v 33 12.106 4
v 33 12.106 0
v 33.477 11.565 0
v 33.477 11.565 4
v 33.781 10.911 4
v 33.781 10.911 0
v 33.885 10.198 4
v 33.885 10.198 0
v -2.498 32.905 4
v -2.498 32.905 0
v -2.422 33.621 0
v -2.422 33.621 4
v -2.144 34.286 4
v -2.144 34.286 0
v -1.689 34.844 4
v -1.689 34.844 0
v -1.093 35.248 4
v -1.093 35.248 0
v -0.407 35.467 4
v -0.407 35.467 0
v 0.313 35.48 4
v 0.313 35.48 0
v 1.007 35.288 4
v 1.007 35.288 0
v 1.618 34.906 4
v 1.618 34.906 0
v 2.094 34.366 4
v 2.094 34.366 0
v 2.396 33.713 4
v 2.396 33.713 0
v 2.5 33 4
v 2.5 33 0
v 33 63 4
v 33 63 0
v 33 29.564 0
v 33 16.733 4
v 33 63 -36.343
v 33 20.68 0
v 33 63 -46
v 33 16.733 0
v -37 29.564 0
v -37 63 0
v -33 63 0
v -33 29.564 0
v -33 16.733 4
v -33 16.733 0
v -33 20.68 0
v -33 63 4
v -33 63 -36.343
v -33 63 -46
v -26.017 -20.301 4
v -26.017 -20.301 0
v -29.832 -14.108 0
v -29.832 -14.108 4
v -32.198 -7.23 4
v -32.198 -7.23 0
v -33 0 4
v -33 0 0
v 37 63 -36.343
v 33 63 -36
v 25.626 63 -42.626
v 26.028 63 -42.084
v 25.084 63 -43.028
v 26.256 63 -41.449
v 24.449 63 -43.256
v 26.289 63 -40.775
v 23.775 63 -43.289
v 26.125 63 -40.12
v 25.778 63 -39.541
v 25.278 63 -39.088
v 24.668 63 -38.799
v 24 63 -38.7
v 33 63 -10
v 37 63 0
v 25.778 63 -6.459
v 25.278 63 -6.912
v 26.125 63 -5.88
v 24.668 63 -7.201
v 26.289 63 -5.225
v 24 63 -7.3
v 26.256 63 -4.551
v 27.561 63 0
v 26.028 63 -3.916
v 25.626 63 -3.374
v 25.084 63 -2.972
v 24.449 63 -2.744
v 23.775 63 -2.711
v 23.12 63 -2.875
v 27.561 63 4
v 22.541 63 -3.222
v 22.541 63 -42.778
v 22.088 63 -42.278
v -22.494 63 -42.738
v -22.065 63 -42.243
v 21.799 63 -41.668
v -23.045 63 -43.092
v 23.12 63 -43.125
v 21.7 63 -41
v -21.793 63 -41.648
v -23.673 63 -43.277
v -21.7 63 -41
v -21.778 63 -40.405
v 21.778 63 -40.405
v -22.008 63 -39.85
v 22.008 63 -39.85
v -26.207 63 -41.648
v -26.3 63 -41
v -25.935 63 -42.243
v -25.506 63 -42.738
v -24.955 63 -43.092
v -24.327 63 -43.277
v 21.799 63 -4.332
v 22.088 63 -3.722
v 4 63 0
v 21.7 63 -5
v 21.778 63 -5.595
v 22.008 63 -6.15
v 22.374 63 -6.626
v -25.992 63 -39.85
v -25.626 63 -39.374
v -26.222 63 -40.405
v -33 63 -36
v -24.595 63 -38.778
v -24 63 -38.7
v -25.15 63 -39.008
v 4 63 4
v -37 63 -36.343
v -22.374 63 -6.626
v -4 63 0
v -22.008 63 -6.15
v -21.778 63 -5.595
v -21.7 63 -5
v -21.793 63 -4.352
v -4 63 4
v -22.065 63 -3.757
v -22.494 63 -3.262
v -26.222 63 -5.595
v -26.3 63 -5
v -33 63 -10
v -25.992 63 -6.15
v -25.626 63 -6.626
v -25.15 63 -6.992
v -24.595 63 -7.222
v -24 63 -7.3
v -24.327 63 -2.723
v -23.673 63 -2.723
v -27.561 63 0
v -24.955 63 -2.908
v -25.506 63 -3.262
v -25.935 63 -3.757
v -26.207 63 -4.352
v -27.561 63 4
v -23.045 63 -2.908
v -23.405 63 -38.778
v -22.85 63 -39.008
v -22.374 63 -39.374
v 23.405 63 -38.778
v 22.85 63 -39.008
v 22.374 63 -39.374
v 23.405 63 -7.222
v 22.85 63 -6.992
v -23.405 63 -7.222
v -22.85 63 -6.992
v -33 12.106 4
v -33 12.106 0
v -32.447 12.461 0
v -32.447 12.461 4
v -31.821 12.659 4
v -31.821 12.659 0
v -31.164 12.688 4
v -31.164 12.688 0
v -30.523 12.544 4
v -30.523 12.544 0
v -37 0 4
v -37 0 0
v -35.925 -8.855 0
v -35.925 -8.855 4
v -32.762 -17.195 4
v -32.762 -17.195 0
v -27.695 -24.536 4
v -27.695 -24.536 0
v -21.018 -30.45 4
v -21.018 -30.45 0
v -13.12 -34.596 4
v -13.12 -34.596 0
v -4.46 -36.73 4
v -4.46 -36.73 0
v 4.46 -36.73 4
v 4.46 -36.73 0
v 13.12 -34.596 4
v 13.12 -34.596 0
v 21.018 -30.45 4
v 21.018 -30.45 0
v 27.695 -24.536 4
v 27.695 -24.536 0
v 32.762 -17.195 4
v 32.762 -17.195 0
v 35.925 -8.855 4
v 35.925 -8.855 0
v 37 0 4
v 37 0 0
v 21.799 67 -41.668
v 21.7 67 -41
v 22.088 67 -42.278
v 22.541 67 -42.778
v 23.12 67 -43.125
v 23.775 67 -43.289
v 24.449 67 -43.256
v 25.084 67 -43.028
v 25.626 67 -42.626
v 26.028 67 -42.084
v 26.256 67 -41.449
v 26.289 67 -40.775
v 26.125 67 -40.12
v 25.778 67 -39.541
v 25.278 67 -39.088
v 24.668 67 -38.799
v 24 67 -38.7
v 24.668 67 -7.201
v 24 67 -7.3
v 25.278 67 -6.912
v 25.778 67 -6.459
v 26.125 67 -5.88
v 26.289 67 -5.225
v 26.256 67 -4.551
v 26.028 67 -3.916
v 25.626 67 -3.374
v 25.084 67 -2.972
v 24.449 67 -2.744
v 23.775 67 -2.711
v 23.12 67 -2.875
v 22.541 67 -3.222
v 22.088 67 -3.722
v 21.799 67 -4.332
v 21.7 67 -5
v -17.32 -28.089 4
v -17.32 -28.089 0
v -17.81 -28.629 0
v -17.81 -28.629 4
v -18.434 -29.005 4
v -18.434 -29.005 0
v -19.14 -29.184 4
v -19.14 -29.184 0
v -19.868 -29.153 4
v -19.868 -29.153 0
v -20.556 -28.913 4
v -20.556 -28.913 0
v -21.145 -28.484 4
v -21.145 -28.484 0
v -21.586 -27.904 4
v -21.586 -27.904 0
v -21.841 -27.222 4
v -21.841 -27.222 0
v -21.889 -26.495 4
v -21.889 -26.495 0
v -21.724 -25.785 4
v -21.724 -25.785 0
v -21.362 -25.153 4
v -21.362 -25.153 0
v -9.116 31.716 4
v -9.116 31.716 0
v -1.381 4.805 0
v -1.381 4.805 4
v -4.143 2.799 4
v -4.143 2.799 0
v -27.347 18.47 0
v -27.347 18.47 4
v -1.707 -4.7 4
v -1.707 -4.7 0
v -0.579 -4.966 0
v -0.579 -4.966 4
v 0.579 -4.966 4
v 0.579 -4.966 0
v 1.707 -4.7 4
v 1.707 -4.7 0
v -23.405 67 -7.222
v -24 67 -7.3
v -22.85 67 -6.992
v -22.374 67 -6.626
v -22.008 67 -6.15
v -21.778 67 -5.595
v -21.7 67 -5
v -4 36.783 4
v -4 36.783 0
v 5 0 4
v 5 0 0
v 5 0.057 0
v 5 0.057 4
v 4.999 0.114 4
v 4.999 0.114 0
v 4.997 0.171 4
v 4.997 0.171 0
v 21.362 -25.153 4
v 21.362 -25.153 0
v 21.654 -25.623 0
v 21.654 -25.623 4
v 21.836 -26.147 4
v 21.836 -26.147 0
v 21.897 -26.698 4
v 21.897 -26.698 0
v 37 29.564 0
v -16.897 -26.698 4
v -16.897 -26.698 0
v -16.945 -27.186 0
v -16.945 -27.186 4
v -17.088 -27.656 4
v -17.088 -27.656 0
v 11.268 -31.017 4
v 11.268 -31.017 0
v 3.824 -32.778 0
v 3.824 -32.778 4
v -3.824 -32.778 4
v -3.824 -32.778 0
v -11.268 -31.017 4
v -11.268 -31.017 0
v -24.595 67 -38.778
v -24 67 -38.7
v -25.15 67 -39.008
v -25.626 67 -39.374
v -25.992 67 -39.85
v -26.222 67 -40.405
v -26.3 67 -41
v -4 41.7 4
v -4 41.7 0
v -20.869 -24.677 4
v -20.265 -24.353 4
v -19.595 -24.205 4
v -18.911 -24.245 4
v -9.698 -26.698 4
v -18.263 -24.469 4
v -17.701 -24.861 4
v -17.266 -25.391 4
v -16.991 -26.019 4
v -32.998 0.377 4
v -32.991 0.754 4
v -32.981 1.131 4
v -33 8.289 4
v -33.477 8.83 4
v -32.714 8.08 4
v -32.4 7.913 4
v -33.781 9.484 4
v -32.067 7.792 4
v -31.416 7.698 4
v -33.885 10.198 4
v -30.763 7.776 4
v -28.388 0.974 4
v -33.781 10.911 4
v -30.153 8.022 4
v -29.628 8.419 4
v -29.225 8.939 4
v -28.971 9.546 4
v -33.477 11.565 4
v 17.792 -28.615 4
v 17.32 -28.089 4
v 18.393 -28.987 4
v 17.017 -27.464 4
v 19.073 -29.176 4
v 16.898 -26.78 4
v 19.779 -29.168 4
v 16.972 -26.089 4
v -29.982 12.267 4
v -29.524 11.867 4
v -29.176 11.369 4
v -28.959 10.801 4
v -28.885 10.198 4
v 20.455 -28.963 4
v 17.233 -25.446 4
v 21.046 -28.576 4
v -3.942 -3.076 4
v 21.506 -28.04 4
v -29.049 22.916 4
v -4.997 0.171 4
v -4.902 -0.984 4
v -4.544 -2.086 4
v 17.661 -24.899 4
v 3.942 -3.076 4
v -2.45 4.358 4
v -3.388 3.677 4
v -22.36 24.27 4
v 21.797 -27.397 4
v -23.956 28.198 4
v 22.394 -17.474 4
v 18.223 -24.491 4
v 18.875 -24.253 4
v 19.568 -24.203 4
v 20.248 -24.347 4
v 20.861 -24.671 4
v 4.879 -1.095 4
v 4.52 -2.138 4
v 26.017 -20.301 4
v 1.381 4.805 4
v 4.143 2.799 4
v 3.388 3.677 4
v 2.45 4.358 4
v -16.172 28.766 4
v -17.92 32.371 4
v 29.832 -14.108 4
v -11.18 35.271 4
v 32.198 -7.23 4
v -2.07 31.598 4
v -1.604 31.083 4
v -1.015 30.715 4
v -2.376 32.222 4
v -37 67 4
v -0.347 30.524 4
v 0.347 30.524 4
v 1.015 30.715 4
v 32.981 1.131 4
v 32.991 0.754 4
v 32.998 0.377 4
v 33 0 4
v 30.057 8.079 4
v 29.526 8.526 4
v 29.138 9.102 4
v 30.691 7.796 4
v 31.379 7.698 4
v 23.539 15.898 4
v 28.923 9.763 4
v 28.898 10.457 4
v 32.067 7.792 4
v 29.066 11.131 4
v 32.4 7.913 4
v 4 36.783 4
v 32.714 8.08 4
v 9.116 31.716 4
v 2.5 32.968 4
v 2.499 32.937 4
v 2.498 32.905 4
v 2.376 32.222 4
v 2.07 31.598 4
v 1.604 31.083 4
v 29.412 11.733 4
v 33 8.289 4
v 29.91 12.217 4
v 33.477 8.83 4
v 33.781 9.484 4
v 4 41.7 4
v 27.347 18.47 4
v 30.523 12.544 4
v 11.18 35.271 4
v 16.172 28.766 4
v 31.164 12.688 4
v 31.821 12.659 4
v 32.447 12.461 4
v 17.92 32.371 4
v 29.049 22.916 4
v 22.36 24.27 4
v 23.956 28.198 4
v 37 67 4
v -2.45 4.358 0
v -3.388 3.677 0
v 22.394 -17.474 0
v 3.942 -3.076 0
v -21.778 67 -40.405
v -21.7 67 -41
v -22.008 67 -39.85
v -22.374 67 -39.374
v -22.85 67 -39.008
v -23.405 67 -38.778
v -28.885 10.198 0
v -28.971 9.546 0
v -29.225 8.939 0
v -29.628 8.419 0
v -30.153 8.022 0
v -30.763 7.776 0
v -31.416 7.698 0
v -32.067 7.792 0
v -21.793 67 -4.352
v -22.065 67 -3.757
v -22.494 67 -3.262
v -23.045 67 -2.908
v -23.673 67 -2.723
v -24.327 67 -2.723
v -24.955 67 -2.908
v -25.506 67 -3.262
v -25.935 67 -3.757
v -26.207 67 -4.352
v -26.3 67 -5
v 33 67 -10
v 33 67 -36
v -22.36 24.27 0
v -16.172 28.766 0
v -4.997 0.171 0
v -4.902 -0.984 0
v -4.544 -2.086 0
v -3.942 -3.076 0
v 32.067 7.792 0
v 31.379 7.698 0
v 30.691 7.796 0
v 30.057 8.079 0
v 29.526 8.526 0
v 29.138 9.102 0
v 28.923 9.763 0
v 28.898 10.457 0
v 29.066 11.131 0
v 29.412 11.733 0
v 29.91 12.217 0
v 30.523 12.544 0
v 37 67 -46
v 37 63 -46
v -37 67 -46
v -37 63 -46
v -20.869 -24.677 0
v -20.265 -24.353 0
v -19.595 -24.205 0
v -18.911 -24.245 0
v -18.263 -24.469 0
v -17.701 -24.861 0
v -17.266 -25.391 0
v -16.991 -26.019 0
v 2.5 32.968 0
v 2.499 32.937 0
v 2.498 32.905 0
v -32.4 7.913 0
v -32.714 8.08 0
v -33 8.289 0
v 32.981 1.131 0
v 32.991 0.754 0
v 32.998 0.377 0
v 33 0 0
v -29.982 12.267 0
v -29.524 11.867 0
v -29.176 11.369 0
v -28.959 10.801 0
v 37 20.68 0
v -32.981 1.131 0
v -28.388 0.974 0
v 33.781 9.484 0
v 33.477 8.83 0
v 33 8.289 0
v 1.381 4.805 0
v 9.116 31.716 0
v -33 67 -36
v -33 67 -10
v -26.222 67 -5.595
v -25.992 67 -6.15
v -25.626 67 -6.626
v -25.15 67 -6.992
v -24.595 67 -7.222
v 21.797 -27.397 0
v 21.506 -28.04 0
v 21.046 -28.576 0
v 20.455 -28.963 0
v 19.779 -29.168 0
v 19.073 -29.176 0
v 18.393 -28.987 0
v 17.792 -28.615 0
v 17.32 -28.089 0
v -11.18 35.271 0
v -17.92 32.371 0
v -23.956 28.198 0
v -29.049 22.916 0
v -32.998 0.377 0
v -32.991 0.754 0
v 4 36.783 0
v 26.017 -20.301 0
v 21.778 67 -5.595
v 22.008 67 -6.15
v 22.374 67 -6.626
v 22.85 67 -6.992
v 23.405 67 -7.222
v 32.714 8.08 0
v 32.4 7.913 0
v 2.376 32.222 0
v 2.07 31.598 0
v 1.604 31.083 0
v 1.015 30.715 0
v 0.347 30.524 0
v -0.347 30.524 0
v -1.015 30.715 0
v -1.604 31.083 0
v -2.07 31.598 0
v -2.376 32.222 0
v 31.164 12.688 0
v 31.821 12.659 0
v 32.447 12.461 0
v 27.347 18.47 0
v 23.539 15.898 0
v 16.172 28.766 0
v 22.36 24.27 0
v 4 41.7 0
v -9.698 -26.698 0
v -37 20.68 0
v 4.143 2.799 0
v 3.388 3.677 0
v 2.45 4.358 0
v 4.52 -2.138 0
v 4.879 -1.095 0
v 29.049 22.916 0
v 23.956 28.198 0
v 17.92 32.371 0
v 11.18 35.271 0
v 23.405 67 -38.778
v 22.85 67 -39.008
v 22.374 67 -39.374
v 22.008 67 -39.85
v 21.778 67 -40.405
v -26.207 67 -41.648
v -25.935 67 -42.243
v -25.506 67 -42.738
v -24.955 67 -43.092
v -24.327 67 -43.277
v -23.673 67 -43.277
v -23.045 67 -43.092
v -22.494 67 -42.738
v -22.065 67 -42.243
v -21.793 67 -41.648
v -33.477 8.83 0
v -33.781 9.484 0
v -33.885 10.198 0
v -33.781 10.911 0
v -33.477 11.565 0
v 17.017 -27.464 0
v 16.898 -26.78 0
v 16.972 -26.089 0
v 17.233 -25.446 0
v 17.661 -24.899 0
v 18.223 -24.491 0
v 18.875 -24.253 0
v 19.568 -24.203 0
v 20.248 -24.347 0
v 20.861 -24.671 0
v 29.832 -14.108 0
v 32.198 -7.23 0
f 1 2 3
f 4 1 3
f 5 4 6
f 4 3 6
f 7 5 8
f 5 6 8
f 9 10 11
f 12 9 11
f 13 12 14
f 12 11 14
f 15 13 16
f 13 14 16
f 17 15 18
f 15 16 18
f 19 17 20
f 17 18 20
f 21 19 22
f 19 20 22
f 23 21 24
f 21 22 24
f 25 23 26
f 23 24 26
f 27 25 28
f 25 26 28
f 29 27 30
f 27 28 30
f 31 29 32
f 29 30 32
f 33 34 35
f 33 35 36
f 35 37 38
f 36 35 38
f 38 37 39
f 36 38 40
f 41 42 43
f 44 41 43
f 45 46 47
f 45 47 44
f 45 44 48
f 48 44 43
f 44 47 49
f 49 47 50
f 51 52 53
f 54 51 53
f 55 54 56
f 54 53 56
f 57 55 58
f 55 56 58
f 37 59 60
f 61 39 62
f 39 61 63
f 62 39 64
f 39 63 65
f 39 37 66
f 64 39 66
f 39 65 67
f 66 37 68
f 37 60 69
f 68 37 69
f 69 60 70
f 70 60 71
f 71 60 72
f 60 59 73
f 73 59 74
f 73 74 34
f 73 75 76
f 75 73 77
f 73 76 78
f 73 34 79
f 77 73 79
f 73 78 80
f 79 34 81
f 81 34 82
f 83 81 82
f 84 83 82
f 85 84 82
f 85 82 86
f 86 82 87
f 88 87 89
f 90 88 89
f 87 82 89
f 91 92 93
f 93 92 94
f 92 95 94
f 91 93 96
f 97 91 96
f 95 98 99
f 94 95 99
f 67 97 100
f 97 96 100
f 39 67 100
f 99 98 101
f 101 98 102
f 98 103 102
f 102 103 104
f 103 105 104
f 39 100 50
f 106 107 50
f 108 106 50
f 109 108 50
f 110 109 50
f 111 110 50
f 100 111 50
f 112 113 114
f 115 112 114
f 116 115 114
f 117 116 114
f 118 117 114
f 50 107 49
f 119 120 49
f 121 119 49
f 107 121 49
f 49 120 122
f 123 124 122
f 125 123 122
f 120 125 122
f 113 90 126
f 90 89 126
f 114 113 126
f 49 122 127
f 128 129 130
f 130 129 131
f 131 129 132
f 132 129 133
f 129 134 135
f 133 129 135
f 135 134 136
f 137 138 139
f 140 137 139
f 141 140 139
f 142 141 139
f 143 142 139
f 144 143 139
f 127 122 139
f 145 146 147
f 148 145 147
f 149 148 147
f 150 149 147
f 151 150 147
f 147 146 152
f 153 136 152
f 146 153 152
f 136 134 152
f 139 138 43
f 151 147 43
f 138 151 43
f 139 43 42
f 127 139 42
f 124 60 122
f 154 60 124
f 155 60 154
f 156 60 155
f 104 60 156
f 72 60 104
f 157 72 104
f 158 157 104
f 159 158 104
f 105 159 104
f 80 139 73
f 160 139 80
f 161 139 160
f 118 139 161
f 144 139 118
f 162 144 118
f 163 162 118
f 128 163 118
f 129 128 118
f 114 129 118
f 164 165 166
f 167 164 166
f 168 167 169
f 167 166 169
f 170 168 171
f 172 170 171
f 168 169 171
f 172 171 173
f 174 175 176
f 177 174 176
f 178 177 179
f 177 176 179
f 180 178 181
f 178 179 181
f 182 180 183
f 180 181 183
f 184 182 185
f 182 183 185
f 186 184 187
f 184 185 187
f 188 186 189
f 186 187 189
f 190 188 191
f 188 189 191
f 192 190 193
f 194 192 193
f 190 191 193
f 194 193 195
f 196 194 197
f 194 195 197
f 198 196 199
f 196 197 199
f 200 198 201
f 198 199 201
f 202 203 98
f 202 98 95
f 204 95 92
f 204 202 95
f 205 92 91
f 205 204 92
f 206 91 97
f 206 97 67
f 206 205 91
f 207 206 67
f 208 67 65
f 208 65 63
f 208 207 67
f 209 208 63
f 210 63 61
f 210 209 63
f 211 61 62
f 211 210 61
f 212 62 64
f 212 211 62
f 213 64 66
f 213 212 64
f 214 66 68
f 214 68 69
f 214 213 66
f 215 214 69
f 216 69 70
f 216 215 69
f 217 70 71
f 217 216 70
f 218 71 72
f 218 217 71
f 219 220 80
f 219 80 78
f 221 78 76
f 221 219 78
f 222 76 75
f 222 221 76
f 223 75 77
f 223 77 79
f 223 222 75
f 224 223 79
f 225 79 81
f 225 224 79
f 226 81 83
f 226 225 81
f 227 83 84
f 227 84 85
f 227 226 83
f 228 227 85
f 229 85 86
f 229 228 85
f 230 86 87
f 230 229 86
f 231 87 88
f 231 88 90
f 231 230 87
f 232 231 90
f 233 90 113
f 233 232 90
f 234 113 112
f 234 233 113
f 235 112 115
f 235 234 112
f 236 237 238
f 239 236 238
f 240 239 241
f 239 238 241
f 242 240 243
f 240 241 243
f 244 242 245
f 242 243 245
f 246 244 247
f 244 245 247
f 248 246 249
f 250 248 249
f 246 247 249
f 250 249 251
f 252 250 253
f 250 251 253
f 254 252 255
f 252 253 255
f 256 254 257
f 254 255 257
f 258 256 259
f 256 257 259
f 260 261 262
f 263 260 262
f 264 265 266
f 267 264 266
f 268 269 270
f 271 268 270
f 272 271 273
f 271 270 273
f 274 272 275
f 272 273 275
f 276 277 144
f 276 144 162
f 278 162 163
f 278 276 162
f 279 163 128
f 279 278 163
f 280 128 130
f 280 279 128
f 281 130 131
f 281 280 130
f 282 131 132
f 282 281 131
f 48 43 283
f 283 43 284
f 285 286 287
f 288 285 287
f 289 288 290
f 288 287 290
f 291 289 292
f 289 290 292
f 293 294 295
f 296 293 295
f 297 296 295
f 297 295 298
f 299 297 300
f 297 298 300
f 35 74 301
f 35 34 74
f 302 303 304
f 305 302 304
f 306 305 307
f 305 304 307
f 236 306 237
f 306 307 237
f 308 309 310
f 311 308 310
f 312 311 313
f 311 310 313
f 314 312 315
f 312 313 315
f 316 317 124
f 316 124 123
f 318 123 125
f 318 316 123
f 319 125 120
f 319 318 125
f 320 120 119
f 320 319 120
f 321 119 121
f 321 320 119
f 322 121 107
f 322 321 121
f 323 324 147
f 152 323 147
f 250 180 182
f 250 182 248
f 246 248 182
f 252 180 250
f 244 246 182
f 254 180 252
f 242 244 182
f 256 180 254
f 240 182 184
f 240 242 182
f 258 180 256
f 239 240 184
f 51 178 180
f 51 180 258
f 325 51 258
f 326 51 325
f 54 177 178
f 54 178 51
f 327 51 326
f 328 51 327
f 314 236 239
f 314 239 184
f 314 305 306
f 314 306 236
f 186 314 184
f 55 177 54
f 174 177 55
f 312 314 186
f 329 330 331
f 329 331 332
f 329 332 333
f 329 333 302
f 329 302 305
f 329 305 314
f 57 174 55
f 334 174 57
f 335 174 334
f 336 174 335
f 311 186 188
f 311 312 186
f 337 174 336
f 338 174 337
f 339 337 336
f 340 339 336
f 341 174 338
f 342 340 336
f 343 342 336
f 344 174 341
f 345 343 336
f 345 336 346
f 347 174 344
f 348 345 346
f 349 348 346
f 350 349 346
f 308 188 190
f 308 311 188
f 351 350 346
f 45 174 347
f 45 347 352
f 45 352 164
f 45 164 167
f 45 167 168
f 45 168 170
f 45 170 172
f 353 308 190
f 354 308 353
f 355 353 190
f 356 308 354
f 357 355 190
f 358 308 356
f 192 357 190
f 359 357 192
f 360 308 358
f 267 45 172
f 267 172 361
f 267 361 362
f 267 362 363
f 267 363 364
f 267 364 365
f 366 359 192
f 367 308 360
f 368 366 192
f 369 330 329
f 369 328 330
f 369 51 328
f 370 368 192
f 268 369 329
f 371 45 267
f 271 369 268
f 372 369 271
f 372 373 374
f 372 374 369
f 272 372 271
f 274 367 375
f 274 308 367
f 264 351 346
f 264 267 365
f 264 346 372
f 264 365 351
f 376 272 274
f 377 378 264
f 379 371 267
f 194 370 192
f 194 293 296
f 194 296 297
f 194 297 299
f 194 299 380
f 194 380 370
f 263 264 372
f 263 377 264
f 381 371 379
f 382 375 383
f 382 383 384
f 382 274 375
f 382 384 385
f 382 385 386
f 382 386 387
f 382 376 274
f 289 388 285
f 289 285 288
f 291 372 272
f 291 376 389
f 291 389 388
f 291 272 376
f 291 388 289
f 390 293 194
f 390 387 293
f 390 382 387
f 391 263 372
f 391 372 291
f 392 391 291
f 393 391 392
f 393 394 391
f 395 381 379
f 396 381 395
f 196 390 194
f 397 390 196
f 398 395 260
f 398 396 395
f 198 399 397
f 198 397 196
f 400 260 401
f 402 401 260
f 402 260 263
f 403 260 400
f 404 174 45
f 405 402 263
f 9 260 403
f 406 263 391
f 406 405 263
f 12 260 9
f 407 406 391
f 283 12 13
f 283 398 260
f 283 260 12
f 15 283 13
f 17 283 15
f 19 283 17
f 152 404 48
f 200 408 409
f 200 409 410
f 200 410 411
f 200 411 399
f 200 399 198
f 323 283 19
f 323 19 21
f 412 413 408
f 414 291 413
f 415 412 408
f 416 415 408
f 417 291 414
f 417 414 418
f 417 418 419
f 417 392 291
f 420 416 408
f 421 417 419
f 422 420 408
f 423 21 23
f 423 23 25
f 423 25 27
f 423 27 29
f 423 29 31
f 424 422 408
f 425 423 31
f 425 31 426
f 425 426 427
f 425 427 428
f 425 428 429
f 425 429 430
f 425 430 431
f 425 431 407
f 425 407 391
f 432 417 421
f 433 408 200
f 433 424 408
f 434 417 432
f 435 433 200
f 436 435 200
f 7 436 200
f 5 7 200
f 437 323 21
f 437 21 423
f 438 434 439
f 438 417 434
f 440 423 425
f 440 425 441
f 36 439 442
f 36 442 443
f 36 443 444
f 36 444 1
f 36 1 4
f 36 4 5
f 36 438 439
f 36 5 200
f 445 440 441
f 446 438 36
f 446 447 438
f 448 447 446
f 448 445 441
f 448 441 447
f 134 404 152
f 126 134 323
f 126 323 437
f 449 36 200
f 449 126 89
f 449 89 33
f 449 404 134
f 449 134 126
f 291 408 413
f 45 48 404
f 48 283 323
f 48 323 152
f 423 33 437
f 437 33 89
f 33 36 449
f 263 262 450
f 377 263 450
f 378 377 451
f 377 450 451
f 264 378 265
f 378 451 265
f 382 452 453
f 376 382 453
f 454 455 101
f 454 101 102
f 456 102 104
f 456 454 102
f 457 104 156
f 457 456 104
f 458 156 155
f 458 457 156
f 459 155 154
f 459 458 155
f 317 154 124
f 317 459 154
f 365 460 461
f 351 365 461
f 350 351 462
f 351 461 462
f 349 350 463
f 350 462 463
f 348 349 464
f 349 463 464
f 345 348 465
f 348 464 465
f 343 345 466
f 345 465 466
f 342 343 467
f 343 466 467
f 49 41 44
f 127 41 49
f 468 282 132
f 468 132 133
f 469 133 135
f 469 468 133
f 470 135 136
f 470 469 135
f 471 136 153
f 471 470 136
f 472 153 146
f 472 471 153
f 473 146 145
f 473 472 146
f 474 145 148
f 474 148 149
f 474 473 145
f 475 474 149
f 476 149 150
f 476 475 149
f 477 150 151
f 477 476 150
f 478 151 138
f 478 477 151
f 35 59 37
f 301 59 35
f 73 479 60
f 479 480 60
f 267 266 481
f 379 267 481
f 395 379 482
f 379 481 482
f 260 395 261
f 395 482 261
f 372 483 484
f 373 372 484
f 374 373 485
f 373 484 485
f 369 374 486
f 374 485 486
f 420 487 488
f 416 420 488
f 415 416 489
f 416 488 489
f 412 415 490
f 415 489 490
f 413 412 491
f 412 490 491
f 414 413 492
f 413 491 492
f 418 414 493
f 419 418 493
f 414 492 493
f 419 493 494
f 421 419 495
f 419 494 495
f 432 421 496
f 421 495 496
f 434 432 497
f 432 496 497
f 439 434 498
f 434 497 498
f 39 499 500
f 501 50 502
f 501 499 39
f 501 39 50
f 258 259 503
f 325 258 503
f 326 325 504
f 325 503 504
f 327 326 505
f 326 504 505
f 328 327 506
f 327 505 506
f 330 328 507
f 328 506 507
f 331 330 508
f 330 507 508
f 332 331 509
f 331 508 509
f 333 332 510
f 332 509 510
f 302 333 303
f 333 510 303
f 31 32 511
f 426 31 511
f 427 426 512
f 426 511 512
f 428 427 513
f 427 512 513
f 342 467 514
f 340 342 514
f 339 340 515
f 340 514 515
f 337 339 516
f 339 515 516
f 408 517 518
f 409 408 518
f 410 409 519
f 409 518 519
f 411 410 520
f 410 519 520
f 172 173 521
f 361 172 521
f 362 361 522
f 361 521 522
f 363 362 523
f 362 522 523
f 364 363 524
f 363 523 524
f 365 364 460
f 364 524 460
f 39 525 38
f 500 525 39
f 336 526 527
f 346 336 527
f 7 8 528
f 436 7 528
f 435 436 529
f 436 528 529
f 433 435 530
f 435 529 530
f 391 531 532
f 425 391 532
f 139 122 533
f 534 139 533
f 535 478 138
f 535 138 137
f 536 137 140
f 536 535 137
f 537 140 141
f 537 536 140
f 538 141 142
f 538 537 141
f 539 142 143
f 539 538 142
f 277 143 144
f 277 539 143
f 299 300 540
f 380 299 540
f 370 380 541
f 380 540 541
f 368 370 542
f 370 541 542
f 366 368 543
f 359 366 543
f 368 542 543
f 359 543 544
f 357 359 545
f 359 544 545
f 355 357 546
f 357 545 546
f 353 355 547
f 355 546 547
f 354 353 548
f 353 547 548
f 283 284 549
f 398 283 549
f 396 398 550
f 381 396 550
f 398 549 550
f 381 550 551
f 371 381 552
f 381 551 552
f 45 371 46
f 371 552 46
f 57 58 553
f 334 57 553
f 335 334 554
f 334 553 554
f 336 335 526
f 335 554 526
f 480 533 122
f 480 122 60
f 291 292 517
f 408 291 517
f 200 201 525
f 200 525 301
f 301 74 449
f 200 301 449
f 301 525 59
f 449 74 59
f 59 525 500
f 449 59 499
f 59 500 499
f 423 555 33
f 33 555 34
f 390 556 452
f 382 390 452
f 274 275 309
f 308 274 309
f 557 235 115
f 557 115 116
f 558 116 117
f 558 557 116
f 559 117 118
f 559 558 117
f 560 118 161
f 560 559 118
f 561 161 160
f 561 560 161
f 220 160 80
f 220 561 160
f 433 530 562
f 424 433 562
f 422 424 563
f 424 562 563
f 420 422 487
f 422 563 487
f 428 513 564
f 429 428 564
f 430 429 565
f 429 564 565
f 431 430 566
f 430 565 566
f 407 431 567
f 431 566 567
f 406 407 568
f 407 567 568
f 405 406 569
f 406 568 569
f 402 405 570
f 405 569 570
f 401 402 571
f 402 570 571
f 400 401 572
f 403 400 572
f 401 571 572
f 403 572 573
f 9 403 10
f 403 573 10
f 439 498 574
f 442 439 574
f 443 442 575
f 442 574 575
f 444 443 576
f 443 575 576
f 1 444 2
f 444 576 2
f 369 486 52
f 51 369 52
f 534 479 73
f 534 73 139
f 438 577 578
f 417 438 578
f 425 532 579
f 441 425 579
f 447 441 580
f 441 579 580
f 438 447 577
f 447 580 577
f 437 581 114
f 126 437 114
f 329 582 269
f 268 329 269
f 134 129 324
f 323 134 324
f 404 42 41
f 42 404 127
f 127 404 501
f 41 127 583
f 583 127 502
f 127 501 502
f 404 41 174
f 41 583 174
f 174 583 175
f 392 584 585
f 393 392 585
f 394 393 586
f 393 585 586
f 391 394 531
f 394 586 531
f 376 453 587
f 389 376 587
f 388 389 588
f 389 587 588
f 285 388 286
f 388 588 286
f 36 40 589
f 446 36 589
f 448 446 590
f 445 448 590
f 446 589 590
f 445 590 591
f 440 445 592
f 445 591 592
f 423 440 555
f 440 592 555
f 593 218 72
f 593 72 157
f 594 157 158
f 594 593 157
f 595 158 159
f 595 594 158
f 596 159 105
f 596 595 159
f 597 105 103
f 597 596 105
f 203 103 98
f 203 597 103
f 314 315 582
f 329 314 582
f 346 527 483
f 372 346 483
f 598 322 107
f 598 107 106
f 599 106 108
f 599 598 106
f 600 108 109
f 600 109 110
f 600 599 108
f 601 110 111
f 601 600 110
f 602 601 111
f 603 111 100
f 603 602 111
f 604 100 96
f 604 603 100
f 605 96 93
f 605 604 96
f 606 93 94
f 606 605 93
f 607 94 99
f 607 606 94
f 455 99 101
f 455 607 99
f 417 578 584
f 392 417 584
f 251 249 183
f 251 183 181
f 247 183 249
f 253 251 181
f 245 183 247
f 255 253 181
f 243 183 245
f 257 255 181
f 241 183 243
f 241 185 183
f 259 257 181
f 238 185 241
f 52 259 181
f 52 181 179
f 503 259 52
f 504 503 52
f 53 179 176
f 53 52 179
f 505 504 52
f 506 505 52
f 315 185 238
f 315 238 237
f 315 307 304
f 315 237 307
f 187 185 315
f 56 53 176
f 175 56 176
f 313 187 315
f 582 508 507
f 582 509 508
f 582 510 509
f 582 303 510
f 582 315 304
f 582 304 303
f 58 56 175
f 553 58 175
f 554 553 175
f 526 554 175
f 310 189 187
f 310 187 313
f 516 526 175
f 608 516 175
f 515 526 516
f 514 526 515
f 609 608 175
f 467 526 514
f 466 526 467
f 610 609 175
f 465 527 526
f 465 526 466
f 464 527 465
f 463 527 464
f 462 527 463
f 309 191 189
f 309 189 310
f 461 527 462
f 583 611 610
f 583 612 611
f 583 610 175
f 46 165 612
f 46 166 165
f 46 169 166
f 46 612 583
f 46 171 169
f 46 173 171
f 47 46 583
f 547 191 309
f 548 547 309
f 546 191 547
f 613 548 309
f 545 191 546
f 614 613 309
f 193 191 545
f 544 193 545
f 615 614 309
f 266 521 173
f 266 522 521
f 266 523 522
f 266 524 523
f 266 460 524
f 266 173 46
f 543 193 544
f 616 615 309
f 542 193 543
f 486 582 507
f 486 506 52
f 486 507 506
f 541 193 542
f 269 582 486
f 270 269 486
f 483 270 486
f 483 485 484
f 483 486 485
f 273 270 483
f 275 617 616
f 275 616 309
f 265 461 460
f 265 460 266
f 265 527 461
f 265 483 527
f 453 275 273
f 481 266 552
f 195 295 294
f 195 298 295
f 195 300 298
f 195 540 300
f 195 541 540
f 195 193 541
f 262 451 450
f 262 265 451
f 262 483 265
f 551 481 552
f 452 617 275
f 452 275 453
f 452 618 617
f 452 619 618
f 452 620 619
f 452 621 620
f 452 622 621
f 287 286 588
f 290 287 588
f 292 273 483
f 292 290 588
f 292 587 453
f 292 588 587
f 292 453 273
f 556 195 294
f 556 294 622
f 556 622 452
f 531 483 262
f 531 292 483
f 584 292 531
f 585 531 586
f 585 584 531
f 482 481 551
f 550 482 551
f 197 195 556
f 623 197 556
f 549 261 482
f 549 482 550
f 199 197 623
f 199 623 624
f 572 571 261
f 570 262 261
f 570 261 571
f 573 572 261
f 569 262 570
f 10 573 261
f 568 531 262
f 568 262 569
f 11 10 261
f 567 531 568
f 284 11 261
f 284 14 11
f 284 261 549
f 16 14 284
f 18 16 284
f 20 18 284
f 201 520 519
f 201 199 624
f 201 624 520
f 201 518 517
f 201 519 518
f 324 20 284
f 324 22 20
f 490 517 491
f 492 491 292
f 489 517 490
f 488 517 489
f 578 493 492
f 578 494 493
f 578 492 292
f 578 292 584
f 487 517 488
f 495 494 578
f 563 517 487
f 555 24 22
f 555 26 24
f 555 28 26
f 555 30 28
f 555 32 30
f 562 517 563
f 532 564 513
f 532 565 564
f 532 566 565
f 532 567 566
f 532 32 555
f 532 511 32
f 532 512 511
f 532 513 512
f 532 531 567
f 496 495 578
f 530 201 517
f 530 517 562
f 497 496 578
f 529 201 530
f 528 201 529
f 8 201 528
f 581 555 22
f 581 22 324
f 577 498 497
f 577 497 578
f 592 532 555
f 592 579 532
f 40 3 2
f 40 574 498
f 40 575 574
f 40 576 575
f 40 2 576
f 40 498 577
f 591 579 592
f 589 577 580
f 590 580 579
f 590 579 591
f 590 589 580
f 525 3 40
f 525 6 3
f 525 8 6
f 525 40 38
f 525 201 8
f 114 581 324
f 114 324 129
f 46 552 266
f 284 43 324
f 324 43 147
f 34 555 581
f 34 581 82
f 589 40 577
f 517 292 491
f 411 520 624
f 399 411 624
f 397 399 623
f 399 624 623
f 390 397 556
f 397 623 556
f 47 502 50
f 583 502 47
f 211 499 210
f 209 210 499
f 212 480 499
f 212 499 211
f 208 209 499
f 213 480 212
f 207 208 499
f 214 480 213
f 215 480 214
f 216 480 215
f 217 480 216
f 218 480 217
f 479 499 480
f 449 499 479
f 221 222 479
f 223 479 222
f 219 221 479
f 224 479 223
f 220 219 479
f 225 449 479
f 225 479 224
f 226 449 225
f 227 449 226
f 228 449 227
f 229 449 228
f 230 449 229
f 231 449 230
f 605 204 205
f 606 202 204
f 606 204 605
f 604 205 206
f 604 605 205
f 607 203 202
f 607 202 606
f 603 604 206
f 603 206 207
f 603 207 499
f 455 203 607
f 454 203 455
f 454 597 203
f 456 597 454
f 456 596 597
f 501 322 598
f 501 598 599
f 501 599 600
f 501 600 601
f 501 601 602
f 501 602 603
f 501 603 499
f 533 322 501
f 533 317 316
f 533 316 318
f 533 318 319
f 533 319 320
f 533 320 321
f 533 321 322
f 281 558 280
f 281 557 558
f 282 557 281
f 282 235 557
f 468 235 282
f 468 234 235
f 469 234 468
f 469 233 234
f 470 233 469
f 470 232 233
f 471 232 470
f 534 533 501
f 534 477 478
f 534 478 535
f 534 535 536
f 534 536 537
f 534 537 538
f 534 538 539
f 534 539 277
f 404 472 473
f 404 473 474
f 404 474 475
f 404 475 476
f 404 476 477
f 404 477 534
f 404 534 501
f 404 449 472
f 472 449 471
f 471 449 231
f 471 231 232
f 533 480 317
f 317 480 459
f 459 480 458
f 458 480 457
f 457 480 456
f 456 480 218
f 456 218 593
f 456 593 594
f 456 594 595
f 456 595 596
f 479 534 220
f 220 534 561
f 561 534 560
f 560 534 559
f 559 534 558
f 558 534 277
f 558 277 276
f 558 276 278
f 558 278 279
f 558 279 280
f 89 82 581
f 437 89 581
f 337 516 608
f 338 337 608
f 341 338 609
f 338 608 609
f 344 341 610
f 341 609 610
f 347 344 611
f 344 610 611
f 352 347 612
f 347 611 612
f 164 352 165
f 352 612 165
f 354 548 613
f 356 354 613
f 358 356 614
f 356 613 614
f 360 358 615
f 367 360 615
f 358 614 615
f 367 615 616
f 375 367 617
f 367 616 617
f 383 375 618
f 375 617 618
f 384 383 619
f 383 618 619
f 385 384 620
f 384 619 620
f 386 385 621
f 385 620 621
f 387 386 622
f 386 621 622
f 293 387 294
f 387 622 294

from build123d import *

# Parameters (mm, degrees)
F1_DEPTH = 4
F3_DEPTH = 4
F5_DEPTH = 4
F6_W     = 4
F6_H     = 26
F6_H_2   = 10
F7_DEPTH = 4


with BuildPart() as f1:
    # F0 (on Top) → F1 (new body)
    with BuildSketch(Plane.XY):
        with BuildLine():
            ThreePointArc((-2.498205853, 32.9053030303), (-0.0473569821, 35.499551423), (2.5, 33))
            ThreePointArc((2.5, 33), (2.499551423, 32.9526430179), (2.498205853, 32.9053030303))
            ThreePointArc((2.498205853, 32.9053030303), (5.8372772609, 32.4796273713), (9.1156141969, 31.7160145323))
            ThreePointArc((9.1156141969, 31.7160145323), (19.3969133257, 26.6975608144), (27.3468425908, 18.4702517664))
            ThreePointArc((27.3468425908, 18.4702517664), (29.0861433838, 15.5883374051), (30.5228148036, 12.544232797))
            ThreePointArc((30.5228148036, 12.544232797), (31.8205738268, 12.6592996005), (33, 12.1057901124))
            Line((33, 12.1057901124), (33, 16.7332005307))
            ThreePointArc((33, 16.7332005307), (21.0416278254, 30.4343539188), (4, 36.7831483155))
            ThreePointArc((4, 36.7831483155), (0, 37), (-4, 36.7831483155))
            ThreePointArc((-4, 36.7831483155), (-21.0416278254, 30.4343539188), (-33, 16.7332005307))
            Line((-33, 16.7332005307), (-33, 12.1057901124))
            ThreePointArc((-33, 12.1057901124), (-31.8205738268, 12.6592996005), (-30.5228148036, 12.544232797))
            ThreePointArc((-30.5228148036, 12.544232797), (-29.0861433838, 15.5883374051), (-27.3468425908, 18.4702517664))
            ThreePointArc((-27.3468425908, 18.4702517664), (-19.3969133257, 26.6975608144), (-9.1156141969, 31.7160145323))
            ThreePointArc((-9.1156141969, 31.7160145323), (-5.8372772609, 32.4796273713), (-2.498205853, 32.9053030303))
        make_face()
        with BuildLine():
            ThreePointArc((2.498205853, 32.9053030303), (0, 30.5), (-2.498205853, 32.9053030303))
            ThreePointArc((-2.498205853, 32.9053030303), (-5.8372772609, 32.4796273713), (-9.1156141969, 31.7160145323))
            Line((-9.1156141969, 31.7160145323), (-7.8462162594, 27.2993902036))
            Line((-7.8462162594, 27.2993902036), (-1.3811536662, 4.8054567473))
            ThreePointArc((-1.3811536662, 4.8054567473), (0, 5), (1.3811536662, 4.8054567473))
            Line((1.3811536662, 4.8054567473), (7.8462162594, 27.2993902036))
            Line((7.8462162594, 27.2993902036), (9.1156141969, 31.7160145323))
            ThreePointArc((9.1156141969, 31.7160145323), (5.8372772609, 32.4796273713), (2.498205853, 32.9053030303))
        make_face()
        with BuildLine():
            Line((-4.1434609986, 2.7985229949), (-27.3468425908, 18.4702517664))
            ThreePointArc((-27.3468425908, 18.4702517664), (-29.0861433838, 15.5883374051), (-30.5228148036, 12.544232797))
            ThreePointArc((-30.5228148036, 12.544232797), (-29.3348497225, 11.6284476748), (-28.8848650377, 10.1975608144))
            ThreePointArc((-28.8848650377, 10.1975608144), (-29.8773529706, 8.2032169705), (-32.0667909317, 7.7923628859))
            ThreePointArc((-32.0667909317, 7.7923628859), (-32.6937791328, 4.4851762523), (-32.9806019929, 1.1313232023))
            Line((-32.9806019929, 1.1313232023), (-28.3878771097, 0.9737804072))
            Line((-28.3878771097, 0.9737804072), (-4.997060908, 0.1714126064))
            ThreePointArc((-4.997060908, 0.1714126064), (-4.7552825815, 1.5450849719), (-4.1434609986, 2.7985229949))
        make_face()
        with BuildLine():
            ThreePointArc((30.5228148036, 12.544232797), (29.0861433838, 15.5883374051), (27.3468425908, 18.4702517664))
            Line((27.3468425908, 18.4702517664), (23.5386487783, 15.8981706108))
            Line((23.5386487783, 15.8981706108), (4.1434609986, 2.7985229949))
            ThreePointArc((4.1434609986, 2.7985229949), (4.7552825815, 1.5450849719), (4.997060908, 0.1714126064))
            Line((4.997060908, 0.1714126064), (32.9806019929, 1.1313232023))
            ThreePointArc((32.9806019929, 1.1313232023), (32.6937791328, 4.4851762523), (32.0667909317, 7.7923628859))
            ThreePointArc((32.0667909317, 7.7923628859), (29.007223747, 9.4250183284), (30.5228148036, 12.544232797))
        make_face()
        with BuildLine():
            ThreePointArc((1.3811536662, 4.8054567473), (0, 5), (-1.3811536662, 4.8054567473))
            Line((-1.3811536662, 4.8054567473), (0, 0))
            Line((0, 0), (1.3811536662, 4.8054567473))
        make_face()
        with BuildLine():
            Line((0, 0), (-1.3811536662, 4.8054567473))
            ThreePointArc((-1.3811536662, 4.8054567473), (-2.9389262615, 4.0450849719), (-4.1434609986, 2.7985229949))
            Line((-4.1434609986, 2.7985229949), (0, 0))
        make_face()
        with BuildLine():
            Line((0, 0), (-4.1434609986, 2.7985229949))
            ThreePointArc((-4.1434609986, 2.7985229949), (-4.7552825815, 1.5450849719), (-4.997060908, 0.1714126064))
            Line((-4.997060908, 0.1714126064), (0, 0))
        make_face()
        with BuildLine():
            ThreePointArc((4.1434609986, 2.7985229949), (2.9389262615, 4.0450849719), (1.3811536662, 4.8054567473))
            Line((1.3811536662, 4.8054567473), (0, 0))
            Line((0, 0), (4.1434609986, 2.7985229949))
        make_face()
        with BuildLine():
            Line((-1.7071998188, -4.6995179305), (0, 0))
            Line((0, 0), (-3.9419533944, -3.0758744182))
            ThreePointArc((-3.9419533944, -3.0758744182), (-2.9389262615, -4.0450849719), (-1.7071998188, -4.6995179305))
        make_face()
        with BuildLine():
            Line((-3.9419533944, -3.0758744182), (0, 0))
            Line((0, 0), (-4.997060908, 0.1714126064))
            ThreePointArc((-4.997060908, 0.1714126064), (-4.7552825815, -1.5450849719), (-3.9419533944, -3.0758744182))
        make_face()
        with BuildLine():
            Line((3.9419533944, -3.0758744182), (0, 0))
            Line((0, 0), (1.7071998188, -4.6995179305))
            ThreePointArc((1.7071998188, -4.6995179305), (2.9389262615, -4.0450849719), (3.9419533944, -3.0758744182))
        make_face()
        with BuildLine():
            Line((1.7071998188, -4.6995179305), (0, 0))
            Line((0, 0), (-1.7071998188, -4.6995179305))
            ThreePointArc((-1.7071998188, -4.6995179305), (0, -5), (1.7071998188, -4.6995179305))
        make_face()
        with BuildLine():
            Line((4.1434609986, 2.7985229949), (0, 0))
            Line((0, 0), (4.997060908, 0.1714126064))
            ThreePointArc((4.997060908, 0.1714126064), (4.7552825815, 1.5450849719), (4.1434609986, 2.7985229949))
        make_face()
        with BuildLine():
            Line((4.997060908, 0.1714126064), (0, 0))
            Line((0, 0), (3.9419533944, -3.0758744182))
            ThreePointArc((3.9419533944, -3.0758744182), (4.7280951224, -1.6263814171), (5, 0))
            ThreePointArc((5, 0), (4.999265173, 0.0857189009), (4.997060908, 0.1714126064))
        make_face()
        with BuildLine():
            ThreePointArc((-33, 8.2893315164), (-33.8848650377, 10.1975608144), (-33, 12.1057901124))
            Line((-33, 12.1057901124), (-33, 16.7332005307))
            ThreePointArc((-33, 16.7332005307), (-35.9861084309, 8.602325267), (-37, 0))
            ThreePointArc((-37, 0), (0, -37), (37, 0))
            ThreePointArc((37, 0), (35.9861084309, 8.602325267), (33, 16.7332005307))
            Line((33, 16.7332005307), (33, 12.1057901124))
            ThreePointArc((33, 12.1057901124), (33.6528859157, 11.2492648113), (33.8848650377, 10.1975608144))
            ThreePointArc((33.8848650377, 10.1975608144), (33.6528859157, 9.1458568174), (33, 8.2893315164))
            Line((33, 8.2893315164), (33, 0))
            ThreePointArc((33, 0), (31.2054278075, -10.7341173531), (26.0168924031, -20.3007711599))
            ThreePointArc((26.0168924031, -20.3007711599), (23.8135024738, -22.8455050268), (21.3623428339, -25.152540799))
            ThreePointArc((21.3623428339, -25.152540799), (21.759493882, -25.8801177799), (21.8969133257, -26.6975608144))
            ThreePointArc((21.8969133257, -26.6975608144), (20.1242780272, -29.0894095953), (17.3201608529, -28.0893579142))
            ThreePointArc((17.3201608529, -28.0893579142), (14.3685894638, -29.7076360019), (11.2675188041, -31.016818341))
            ThreePointArc((11.2675188041, -31.016818341), (0, -33), (-11.2675188041, -31.016818341))
            ThreePointArc((-11.2675188041, -31.016818341), (-14.3685894638, -29.7076360019), (-17.3201608529, -28.0893579142))
            ThreePointArc((-17.3201608529, -28.0893579142), (-20.8663764564, -28.7201033003), (-21.3623428339, -25.152540799))
            ThreePointArc((-21.3623428339, -25.152540799), (-23.8135024738, -22.8455050268), (-26.0168924031, -20.3007711599))
            ThreePointArc((-26.0168924031, -20.3007711599), (-31.2054278075, -10.7341173531), (-33, 0))
            Line((-33, 0), (-33, 8.2893315164))
        make_face()
        with BuildLine():
            ThreePointArc((-32.9806019929, 1.1313232023), (-32.6937791328, 4.4851762523), (-32.0667909317, 7.7923628859))
            ThreePointArc((-32.0667909317, 7.7923628859), (-32.5599678414, 7.9909495208), (-33, 8.2893315164))
            Line((-33, 8.2893315164), (-33, 0))
            ThreePointArc((-33, 0), (-32.9951501418, 0.565744746), (-32.9806019929, 1.1313232023))
        make_face()
        with BuildLine():
            ThreePointArc((33, 8.2893315164), (32.5599678414, 7.9909495208), (32.0667909317, 7.7923628859))
            ThreePointArc((32.0667909317, 7.7923628859), (32.6937791328, 4.4851762523), (32.9806019929, 1.1313232023))
            ThreePointArc((32.9806019929, 1.1313232023), (32.9951501418, 0.565744746), (33, 0))
            Line((33, 0), (33, 8.2893315164))
        make_face()
        with BuildLine():
            ThreePointArc((-1.7071998188, -4.6995179305), (-2.9389262615, -4.0450849719), (-3.9419533944, -3.0758744182))
            Line((-3.9419533944, -3.0758744182), (-26.0168924031, -20.3007711599))
            ThreePointArc((-26.0168924031, -20.3007711599), (-23.8135024738, -22.8455050268), (-21.3623428339, -25.152540799))
            ThreePointArc((-21.3623428339, -25.152540799), (-18.5794702912, -24.334980258), (-16.8969133257, -26.6975608144))
            ThreePointArc((-16.8969133257, -26.6975608144), (-17.0050645447, -27.4249255159), (-17.3201608529, -28.0893579142))
            ThreePointArc((-17.3201608529, -28.0893579142), (-14.3685894638, -29.7076360019), (-11.2675188041, -31.016818341))
            Line((-11.2675188041, -31.016818341), (-9.6984566628, -26.6975608144))
            Line((-9.6984566628, -26.6975608144), (-1.7071998188, -4.6995179305))
        make_face()
        with BuildLine():
            ThreePointArc((3.9419533944, -3.0758744182), (2.9389262615, -4.0450849719), (1.7071998188, -4.6995179305))
            Line((1.7071998188, -4.6995179305), (11.2675188041, -31.016818341))
            ThreePointArc((11.2675188041, -31.016818341), (14.3685894638, -29.7076360019), (17.3201608529, -28.0893579142))
            ThreePointArc((17.3201608529, -28.0893579142), (17.9274501949, -24.6750183284), (21.3623428339, -25.152540799))
            ThreePointArc((21.3623428339, -25.152540799), (23.8135024738, -22.8455050268), (26.0168924031, -20.3007711599))
            Line((26.0168924031, -20.3007711599), (22.3939012537, -17.4737804072))
            Line((22.3939012537, -17.4737804072), (3.9419533944, -3.0758744182))
        make_face()
        with BuildLine():
            ThreePointArc((-37, 0), (-35.9861084309, 8.602325267), (-33, 16.7332005307))
            Line((-33, 16.7332005307), (-33, 63))
            Line((-33, 63), (-27.5608655065, 63))
            Line((-27.5608655065, 63), (-4, 63))
            Line((-4, 63), (0, 63))
            Line((0, 63), (4, 63))
            Line((4, 63), (27.5608655065, 63))
            Line((27.5608655065, 63), (33, 63))
            Line((33, 63), (33, 16.7332005307))
            ThreePointArc((33, 16.7332005307), (35.9861084309, 8.602325267), (37, 0))
            Line((37, 0), (37, 67))
            Line((37, 67), (0, 67))
            Line((0, 67), (-37, 67))
            Line((-37, 67), (-37, 0))
        make_face()
        Polygon((-27.5608655065, 63), (-33, 63), (-4, 36.7831483155), (-4, 41.7002856364), align=None)
        with BuildLine():
            Line((-4, 41.7002856364), (-4, 36.7831483155))
            ThreePointArc((-4, 36.7831483155), (0, 37), (4, 36.7831483155))
            Line((4, 36.7831483155), (4, 41.7002856364))
            Line((4, 41.7002856364), (-4, 41.7002856364))
        make_face()
        Polygon((4, 36.7831483155), (33, 63), (27.5608655065, 63), (4, 41.7002856364), align=None)
        Polygon((-4, 63), (-4, 41.7002856364), (4, 41.7002856364), (4, 63), (0, 63), align=None)
    extrude(amount=F1_DEPTH)

    # F2 (on face) → F3 (join)
    with BuildSketch(Plane(origin=(-37, 0, 0), x_dir=(0, -1, 0), z_dir=(-1, 0, 0))):
        Polygon((-17, 0), (-17, 4), (-20.68, 0), align=None)
        Polygon((-17, 4), (-67, 4), (-67, 0), (-63, 0), (-29.5643059095, 0), (-20.68, 0), align=None)
        Polygon((-63, 0), (-67, 0), (-67, -46), (-63, -46), (-63, -36.3431457505), align=None)
        Polygon((-63, -46), (-20.68, 0), (-29.5643059095, 0), (-63, -36.3431457505), align=None)
    extrude(amount=-F3_DEPTH)

    # F4 (on face) → F5 (join)
    with BuildSketch(Plane.YZ.offset(37)):
        Polygon((20.68, 0), (17, 4), (17, 0), align=None)
        Polygon((67, 0), (67, 4), (17, 4), (20.68, 0), (26.6568542495, 0), (29.5643059095, 0), (63, 0), align=None)
        Polygon((67, -46), (67, 0), (63, 0), (63, -36.3431457505), (29.5643059095, 0), (26.6568542495, 0), (20.68, 0), (63, -46), align=None)
    extrude(amount=-F5_DEPTH)

    # F6 (on face) → F7 (join)
    with BuildSketch(Plane(origin=(0, 67, 0), x_dir=(-1, 0, 0), z_dir=(0, 1, 0))):
        with BuildLine():
            Line((-33, -36), (-33, -46))
            Line((-33, -46), (0, -46))
            Line((0, -46), (0, -41))
            Line((0, -41), (-21.7, -41))
            ThreePointArc((-21.7, -41), (-25.6263455967, -42.6263455967), (-24, -38.7))
            Line((-24, -38.7), (-24, -36))
            Line((-24, -36), (-33, -36))
        make_face()
        with Locations((-35, -23)):
            Rectangle(F6_W, F6_H)
        with BuildLine():
            Line((0, -41), (0, -46))
            Line((0, -46), (33, -46))
            Line((33, -46), (33, -36))
            Line((33, -36), (24, -36))
            Line((24, -36), (24, -38.7))
            ThreePointArc((24, -38.7), (25.6263455967, -39.3736544033), (26.3, -41))
            ThreePointArc((26.3, -41), (24, -43.3), (21.7, -41))
            Line((21.7, -41), (0, -41))
        make_face()
        with Locations((35, -41)):
            Rectangle(F6_W, F6_H_2)
        with BuildLine():
            Line((-21.7, -41), (0, -41))
            Line((0, -41), (0, -36))
            Line((0, -36), (-24, -36))
            Line((-24, -36), (-24, -38.7))
            ThreePointArc((-24, -38.7), (-22.3736544033, -39.3736544033), (-21.7, -41))
        make_face()
        with BuildLine():
            Line((0, -36), (0, -41))
            Line((0, -41), (21.7, -41))
            ThreePointArc((21.7, -41), (22.3736544033, -39.3736544033), (24, -38.7))
            Line((24, -38.7), (24, -36))
            Line((24, -36), (0, -36))
        make_face()
        with BuildLine():
            Line((-33, 0), (-33, -10))
            Line((-33, -10), (-24, -10))
            Line((-24, -10), (-24, -7.3))
            ThreePointArc((-24, -7.3), (-25.6263455967, -3.3736544033), (-21.7, -5))
            Line((-21.7, -5), (0, -5))
            Line((0, -5), (0, 0))
            Line((0, 0), (-33, 0))
        make_face()
        Polygon((-37, 4), (-37, 0), (-33, 0), (0, 0), (33, 0), (37, 0), (37, 4), align=None)
        with BuildLine():
            Line((-24, -7.3), (-24, -10))
            Line((-24, -10), (0, -10))
            Line((0, -10), (0, -5))
            Line((0, -5), (-21.7, -5))
            ThreePointArc((-21.7, -5), (-22.3736544033, -6.6263455967), (-24, -7.3))
        make_face()
        with BuildLine():
            Line((24, -10), (33, -10))
            Line((33, -10), (33, 0))
            Line((33, 0), (0, 0))
            Line((0, 0), (0, -5))
            Line((0, -5), (21.7, -5))
            ThreePointArc((21.7, -5), (24, -2.7), (26.3, -5))
            ThreePointArc((26.3, -5), (25.6263455967, -6.6263455967), (24, -7.3))
            Line((24, -7.3), (24, -10))
        make_face()
        with BuildLine():
            Line((0, -5), (0, -10))
            Line((0, -10), (24, -10))
            Line((24, -10), (24, -7.3))
            ThreePointArc((24, -7.3), (22.3736544033, -6.6263455967), (21.7, -5))
            Line((21.7, -5), (0, -5))
        make_face()
    extrude(amount=-F7_DEPTH)


solid = f1.part
